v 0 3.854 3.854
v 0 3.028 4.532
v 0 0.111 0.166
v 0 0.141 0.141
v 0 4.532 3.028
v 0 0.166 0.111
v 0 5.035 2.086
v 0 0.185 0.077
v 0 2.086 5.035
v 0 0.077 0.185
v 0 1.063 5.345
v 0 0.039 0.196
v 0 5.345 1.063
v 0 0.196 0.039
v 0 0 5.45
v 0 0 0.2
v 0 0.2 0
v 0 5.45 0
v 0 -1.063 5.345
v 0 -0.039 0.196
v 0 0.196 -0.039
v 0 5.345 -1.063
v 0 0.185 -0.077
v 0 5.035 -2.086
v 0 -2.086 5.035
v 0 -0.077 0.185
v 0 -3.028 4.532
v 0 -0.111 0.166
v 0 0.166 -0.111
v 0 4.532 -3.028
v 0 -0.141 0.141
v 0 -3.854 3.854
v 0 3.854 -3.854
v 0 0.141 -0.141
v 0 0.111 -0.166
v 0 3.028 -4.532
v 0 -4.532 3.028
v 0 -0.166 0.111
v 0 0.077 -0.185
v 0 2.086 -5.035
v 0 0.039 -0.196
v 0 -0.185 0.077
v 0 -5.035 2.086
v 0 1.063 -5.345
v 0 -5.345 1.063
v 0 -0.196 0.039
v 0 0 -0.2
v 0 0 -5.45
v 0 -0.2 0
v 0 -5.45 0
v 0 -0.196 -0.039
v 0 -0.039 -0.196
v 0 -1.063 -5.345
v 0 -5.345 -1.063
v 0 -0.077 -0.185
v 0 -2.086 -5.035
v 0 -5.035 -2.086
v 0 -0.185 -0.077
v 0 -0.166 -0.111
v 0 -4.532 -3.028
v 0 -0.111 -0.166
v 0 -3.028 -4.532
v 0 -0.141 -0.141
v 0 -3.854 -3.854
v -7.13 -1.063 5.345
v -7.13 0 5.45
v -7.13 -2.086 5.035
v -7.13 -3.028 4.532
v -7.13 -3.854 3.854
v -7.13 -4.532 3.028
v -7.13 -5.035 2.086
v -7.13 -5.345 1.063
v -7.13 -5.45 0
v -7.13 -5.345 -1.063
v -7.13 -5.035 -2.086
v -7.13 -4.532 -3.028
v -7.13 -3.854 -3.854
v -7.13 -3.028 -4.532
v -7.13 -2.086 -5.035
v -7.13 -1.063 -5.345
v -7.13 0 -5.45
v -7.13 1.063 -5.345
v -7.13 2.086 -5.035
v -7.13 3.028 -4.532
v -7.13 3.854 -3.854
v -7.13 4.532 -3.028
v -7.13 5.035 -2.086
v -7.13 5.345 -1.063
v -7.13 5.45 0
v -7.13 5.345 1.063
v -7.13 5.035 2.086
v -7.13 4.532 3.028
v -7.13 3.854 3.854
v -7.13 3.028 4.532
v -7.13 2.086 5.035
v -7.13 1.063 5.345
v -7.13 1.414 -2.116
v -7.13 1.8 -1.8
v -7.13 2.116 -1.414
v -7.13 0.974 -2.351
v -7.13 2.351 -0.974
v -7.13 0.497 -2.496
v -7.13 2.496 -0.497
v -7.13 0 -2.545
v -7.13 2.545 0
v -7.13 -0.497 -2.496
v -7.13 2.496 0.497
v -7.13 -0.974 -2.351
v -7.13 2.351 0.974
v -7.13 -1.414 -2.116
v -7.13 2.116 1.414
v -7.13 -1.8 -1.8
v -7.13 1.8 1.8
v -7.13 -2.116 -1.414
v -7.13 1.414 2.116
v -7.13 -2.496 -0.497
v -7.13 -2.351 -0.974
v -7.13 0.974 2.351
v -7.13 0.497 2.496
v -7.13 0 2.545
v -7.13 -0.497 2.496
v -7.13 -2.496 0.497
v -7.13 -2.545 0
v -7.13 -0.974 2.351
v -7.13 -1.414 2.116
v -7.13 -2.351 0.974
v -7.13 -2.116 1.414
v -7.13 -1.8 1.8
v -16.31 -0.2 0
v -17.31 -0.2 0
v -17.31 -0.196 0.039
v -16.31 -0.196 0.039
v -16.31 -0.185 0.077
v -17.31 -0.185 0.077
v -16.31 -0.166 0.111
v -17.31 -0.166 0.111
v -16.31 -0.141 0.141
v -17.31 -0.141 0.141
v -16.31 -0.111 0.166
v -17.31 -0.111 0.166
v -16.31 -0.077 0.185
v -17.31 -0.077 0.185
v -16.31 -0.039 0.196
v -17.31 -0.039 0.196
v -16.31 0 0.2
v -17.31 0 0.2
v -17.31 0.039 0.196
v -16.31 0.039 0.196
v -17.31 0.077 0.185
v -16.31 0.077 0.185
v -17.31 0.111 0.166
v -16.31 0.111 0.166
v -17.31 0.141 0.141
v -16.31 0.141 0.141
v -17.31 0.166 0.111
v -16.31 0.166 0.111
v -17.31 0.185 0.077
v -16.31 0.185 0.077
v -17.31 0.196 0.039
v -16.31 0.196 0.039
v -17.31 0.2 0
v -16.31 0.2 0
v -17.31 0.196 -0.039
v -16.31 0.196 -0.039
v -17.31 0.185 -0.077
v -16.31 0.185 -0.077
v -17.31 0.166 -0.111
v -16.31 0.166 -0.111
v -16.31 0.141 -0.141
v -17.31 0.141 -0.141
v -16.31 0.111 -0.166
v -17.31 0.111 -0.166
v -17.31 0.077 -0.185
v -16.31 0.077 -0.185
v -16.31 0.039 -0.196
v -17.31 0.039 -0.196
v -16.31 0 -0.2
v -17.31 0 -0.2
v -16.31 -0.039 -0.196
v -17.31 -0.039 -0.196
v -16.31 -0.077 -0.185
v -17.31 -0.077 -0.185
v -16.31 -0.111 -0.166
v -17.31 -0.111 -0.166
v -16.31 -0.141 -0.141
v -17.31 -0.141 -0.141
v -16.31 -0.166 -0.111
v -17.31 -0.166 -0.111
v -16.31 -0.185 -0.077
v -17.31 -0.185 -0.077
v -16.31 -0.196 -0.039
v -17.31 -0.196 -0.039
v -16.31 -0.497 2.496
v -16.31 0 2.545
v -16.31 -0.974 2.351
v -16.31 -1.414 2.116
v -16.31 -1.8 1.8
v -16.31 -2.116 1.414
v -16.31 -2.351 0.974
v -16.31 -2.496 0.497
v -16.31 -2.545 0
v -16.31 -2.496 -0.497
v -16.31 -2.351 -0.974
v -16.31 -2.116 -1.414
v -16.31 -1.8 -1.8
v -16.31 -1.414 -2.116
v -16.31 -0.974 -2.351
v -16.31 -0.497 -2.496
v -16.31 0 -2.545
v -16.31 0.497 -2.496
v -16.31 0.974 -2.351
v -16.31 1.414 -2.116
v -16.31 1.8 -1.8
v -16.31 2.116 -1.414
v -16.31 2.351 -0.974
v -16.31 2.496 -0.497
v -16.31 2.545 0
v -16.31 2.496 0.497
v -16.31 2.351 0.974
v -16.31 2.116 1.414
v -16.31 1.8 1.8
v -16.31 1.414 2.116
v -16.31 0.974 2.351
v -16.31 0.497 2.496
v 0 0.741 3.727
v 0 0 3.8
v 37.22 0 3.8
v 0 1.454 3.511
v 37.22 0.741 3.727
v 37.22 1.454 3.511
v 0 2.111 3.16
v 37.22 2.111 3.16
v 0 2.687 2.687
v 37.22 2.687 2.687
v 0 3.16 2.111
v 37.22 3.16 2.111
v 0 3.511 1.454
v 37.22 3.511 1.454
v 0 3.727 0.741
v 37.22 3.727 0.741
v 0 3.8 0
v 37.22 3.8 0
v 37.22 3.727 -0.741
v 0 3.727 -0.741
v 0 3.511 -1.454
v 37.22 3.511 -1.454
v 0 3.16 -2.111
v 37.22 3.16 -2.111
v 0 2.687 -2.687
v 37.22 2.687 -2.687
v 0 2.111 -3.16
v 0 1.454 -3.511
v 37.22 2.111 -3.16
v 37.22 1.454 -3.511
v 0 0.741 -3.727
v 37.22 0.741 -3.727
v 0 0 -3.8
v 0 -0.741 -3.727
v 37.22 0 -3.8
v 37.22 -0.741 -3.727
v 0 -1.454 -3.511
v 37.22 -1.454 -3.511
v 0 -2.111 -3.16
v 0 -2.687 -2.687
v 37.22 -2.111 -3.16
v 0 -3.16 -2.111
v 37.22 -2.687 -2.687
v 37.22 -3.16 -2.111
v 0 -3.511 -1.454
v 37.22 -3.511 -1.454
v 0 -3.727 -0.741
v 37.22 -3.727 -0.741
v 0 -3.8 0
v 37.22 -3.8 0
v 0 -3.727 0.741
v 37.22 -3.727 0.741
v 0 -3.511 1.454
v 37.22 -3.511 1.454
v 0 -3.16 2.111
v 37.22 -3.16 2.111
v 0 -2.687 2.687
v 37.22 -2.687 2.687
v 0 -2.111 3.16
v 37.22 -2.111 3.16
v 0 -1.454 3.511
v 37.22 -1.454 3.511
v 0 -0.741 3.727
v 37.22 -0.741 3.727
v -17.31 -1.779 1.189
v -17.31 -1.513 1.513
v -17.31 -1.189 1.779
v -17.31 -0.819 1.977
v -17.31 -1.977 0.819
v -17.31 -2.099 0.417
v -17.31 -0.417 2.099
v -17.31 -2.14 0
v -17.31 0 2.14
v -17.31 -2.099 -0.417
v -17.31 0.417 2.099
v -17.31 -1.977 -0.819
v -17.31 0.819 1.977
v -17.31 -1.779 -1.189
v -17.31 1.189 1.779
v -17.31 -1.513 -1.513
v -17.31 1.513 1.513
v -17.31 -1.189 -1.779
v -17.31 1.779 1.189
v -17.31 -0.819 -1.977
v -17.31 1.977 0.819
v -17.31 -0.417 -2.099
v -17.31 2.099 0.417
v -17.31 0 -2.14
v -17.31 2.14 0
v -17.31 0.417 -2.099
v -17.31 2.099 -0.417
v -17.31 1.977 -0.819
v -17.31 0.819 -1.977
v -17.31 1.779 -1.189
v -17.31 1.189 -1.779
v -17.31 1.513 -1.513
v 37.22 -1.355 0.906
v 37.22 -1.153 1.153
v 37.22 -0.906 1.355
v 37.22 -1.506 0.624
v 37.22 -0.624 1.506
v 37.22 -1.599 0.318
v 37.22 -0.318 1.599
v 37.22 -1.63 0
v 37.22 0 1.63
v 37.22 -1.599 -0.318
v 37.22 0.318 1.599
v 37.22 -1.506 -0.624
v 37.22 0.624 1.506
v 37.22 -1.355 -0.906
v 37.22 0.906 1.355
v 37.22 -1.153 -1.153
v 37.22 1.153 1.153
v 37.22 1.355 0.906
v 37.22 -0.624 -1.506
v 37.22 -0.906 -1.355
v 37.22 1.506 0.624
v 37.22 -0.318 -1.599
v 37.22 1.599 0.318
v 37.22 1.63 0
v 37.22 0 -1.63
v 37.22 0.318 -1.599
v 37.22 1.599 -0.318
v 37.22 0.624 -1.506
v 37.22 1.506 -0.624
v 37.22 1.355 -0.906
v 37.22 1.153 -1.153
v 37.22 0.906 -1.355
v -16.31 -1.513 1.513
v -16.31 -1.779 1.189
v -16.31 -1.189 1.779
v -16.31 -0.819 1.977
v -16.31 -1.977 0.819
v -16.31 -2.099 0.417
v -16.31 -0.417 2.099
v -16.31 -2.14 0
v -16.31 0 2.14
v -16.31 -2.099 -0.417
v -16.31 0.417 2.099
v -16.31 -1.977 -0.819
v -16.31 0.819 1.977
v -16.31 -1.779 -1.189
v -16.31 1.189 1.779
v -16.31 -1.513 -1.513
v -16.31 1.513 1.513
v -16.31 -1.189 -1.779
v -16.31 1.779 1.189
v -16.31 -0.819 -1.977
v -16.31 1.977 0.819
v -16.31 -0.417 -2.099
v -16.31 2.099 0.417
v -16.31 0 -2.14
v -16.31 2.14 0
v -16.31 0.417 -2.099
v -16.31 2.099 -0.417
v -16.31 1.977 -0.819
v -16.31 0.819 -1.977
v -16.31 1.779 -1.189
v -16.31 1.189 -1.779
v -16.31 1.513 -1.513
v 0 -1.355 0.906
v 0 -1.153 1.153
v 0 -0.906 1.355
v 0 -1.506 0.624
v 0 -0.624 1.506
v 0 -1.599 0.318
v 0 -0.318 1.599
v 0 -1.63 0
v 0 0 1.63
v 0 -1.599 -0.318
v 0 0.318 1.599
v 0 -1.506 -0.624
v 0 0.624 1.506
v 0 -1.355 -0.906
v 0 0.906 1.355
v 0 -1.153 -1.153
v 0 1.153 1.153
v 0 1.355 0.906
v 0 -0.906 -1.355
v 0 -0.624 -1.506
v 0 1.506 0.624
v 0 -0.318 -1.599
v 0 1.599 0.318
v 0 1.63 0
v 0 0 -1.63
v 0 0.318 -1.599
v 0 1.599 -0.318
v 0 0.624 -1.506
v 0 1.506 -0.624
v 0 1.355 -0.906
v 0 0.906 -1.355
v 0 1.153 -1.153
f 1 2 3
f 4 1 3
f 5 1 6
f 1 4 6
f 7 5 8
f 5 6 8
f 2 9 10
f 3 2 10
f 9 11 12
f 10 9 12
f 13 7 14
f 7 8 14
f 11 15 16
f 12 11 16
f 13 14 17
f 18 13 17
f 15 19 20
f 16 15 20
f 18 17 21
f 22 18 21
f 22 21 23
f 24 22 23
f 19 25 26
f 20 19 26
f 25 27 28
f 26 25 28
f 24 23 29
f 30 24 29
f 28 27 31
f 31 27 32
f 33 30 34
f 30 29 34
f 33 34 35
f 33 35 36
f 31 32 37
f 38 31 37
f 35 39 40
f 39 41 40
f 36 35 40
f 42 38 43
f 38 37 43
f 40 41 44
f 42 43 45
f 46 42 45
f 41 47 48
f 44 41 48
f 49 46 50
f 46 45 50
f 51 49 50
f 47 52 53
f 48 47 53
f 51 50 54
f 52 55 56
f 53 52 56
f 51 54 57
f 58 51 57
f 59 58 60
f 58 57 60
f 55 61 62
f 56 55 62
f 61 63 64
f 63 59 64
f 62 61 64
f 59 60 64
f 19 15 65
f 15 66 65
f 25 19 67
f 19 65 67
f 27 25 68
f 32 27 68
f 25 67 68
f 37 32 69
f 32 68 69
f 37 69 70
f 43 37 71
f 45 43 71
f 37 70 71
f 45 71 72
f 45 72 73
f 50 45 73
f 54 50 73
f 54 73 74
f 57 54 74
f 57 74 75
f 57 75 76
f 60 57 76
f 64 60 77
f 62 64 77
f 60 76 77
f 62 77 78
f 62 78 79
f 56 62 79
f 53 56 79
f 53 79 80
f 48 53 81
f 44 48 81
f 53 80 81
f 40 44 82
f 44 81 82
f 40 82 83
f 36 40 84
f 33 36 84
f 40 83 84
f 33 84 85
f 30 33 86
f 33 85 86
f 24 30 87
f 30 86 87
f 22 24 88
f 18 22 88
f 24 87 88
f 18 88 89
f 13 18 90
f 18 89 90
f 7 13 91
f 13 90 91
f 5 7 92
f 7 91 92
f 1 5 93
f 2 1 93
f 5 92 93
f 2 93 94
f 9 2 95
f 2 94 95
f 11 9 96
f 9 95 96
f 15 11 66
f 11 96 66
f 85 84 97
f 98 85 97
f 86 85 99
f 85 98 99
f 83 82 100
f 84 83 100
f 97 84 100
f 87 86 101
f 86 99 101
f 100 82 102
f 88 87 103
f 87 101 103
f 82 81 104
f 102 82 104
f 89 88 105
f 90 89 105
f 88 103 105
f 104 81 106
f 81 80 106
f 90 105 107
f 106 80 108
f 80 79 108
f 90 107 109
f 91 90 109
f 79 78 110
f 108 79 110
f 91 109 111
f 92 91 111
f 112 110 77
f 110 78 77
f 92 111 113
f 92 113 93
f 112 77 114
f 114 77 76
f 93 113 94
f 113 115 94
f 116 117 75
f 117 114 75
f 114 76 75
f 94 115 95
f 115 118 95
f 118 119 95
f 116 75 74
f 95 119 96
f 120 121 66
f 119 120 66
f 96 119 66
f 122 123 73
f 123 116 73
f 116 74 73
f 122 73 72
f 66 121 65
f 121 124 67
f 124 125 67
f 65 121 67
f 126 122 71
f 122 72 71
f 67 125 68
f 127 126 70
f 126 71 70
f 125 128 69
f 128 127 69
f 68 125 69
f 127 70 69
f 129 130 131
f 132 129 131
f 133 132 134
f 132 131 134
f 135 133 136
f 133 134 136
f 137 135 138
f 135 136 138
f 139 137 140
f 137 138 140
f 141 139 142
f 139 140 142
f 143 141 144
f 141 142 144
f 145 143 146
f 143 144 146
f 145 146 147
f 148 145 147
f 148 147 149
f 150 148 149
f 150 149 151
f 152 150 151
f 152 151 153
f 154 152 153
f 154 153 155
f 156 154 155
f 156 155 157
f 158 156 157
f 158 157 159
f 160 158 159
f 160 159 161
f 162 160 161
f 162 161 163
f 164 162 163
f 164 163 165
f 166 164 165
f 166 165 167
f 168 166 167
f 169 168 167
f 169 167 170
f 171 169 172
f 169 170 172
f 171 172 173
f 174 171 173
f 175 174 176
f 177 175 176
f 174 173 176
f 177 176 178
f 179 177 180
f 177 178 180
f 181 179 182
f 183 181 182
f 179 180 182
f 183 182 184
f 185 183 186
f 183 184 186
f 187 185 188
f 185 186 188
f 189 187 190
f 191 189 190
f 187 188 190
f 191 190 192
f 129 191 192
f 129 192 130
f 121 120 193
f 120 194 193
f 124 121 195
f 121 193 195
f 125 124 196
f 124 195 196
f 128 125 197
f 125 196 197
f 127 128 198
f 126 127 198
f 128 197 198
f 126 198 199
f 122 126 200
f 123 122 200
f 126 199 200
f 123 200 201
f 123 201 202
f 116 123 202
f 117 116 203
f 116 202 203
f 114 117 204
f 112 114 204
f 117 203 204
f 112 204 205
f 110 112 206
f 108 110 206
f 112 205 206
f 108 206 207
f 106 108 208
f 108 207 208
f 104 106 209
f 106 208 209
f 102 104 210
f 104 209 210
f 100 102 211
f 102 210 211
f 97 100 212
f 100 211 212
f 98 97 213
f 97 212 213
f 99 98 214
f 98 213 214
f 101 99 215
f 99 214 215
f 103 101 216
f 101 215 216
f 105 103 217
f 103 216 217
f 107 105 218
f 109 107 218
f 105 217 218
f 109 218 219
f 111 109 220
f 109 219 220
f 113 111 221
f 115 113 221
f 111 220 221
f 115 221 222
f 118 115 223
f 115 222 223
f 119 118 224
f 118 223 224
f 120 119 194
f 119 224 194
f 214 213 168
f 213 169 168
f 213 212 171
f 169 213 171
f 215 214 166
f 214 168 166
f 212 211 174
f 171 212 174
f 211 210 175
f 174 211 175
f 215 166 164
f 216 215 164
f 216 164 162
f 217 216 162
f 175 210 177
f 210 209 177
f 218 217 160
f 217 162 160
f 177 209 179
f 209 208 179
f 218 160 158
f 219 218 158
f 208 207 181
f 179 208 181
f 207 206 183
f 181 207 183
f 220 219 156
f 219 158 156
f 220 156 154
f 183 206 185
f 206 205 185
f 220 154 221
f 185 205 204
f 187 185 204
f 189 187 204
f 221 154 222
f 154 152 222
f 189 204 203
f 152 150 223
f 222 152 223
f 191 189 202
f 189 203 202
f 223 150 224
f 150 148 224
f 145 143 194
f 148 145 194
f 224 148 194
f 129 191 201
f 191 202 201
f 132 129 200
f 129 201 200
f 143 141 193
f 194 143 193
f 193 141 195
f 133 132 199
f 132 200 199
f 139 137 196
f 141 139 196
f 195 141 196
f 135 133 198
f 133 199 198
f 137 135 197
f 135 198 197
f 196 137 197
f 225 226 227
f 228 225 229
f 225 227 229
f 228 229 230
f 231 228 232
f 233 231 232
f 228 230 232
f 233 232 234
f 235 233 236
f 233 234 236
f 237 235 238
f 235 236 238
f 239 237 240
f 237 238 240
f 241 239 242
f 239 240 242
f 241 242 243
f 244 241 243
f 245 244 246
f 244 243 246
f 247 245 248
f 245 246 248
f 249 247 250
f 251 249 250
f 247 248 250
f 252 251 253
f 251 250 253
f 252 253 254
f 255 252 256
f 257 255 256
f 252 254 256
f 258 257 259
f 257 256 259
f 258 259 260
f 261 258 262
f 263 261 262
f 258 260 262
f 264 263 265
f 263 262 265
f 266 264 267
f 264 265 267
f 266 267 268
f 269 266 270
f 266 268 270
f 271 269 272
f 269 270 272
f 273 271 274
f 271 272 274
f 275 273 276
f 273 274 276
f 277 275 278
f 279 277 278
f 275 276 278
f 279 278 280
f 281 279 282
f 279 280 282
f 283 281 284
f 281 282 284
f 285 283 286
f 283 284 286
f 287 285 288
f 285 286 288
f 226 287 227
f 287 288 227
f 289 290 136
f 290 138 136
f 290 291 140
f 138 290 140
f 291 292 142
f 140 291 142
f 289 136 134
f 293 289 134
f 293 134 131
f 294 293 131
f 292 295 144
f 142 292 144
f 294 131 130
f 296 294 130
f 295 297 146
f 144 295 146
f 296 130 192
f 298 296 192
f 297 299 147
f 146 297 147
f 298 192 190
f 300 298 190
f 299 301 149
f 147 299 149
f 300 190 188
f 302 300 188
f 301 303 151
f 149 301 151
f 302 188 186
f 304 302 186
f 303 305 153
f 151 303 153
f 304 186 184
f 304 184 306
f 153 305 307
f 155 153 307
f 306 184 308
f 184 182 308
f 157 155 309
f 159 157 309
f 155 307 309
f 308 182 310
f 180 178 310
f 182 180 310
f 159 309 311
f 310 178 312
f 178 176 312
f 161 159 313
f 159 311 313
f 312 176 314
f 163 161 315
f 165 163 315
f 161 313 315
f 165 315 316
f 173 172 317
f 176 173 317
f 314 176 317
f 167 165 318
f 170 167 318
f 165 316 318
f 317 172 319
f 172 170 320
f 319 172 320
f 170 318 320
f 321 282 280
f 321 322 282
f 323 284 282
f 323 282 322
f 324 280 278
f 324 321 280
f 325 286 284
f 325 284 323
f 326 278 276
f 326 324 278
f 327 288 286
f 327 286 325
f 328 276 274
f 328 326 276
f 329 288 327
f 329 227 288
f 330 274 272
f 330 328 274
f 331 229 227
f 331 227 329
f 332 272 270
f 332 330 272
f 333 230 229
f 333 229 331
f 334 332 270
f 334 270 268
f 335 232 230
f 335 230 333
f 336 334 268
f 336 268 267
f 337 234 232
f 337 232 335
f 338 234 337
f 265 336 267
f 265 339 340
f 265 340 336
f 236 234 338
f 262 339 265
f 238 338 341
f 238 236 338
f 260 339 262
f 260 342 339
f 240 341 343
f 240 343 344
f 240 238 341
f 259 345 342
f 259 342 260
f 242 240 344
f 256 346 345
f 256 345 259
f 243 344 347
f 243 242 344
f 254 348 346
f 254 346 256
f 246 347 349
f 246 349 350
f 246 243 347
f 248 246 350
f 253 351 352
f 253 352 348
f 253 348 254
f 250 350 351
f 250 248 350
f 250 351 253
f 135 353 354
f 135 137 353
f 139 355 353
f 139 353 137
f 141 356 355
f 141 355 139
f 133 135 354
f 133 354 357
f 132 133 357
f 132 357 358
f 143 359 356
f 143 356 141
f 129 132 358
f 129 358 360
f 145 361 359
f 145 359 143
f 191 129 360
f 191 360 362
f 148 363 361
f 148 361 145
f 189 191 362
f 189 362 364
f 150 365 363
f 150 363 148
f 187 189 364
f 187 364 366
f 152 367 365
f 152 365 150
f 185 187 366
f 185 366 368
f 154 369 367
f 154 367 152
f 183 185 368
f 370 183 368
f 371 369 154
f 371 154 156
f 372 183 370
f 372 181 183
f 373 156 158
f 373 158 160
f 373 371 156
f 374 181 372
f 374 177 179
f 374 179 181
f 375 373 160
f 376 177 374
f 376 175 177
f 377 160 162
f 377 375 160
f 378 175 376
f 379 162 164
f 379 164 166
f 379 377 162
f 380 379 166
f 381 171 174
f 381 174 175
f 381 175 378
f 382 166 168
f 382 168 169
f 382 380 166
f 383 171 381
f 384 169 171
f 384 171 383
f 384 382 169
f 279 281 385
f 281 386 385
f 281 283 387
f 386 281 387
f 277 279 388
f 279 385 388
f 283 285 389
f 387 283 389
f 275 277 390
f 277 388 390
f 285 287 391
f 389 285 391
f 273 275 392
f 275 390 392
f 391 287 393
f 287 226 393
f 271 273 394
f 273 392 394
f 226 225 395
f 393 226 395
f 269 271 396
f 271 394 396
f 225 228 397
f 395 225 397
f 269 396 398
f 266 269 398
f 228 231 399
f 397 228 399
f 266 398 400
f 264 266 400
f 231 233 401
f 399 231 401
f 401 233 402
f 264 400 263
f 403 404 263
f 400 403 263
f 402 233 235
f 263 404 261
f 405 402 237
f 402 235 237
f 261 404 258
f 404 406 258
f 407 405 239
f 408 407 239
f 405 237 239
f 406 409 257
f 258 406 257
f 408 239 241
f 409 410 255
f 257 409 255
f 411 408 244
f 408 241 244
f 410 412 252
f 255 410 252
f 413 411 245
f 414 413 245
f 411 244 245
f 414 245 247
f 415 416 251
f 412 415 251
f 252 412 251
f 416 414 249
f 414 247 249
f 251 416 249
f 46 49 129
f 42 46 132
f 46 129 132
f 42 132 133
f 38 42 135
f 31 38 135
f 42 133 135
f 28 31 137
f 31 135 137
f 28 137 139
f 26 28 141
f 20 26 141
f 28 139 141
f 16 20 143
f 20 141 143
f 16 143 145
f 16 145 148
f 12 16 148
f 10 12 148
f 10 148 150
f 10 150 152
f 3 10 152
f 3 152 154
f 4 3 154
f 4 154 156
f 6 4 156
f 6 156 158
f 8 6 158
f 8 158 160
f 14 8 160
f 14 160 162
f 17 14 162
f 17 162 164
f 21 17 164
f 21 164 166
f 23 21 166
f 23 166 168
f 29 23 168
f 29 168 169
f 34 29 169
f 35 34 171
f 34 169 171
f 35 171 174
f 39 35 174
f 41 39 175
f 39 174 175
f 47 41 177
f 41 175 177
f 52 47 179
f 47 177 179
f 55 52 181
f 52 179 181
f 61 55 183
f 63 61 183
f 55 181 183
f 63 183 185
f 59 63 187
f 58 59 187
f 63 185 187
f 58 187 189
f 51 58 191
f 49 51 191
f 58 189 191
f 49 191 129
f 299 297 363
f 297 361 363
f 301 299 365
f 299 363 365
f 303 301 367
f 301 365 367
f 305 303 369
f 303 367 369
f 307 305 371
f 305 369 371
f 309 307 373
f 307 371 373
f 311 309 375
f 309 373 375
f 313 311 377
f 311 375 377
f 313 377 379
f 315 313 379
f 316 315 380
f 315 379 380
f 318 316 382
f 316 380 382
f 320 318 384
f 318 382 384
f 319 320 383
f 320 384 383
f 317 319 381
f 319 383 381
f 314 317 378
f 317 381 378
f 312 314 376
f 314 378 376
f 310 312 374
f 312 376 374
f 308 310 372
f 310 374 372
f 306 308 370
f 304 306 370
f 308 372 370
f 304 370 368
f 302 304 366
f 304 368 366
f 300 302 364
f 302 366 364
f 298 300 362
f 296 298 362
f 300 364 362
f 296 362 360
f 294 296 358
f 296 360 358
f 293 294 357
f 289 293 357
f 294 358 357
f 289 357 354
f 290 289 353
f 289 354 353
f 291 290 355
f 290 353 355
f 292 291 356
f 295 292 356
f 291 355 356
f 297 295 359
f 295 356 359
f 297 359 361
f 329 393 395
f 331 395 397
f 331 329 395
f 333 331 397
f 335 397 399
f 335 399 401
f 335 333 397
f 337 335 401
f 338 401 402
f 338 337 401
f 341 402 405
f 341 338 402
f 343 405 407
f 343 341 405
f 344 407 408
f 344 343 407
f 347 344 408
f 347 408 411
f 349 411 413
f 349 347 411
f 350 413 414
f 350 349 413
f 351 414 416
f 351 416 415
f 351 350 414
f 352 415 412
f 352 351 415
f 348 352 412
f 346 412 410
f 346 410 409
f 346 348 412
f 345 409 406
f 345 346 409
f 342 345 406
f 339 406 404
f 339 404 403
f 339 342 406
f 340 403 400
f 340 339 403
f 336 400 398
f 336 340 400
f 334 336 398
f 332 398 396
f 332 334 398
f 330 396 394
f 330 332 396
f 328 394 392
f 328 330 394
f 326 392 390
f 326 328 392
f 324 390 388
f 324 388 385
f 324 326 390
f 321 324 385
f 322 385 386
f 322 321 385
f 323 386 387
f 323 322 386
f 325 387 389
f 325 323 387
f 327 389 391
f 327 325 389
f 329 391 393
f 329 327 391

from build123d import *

# Parameters (mm, degrees)
F0_W     = 37.22
F0_H     = 2.17
F2_W     = 1
F2_H     = 2.14
F6_R     = 0.2
F7_DEPTH = 54.531


with BuildPart() as f3:
    # F0 (on Front) → F3 (revolve)
    with BuildSketch(Plane.XZ):
        with Locations((18.61, 2.715)):
            Rectangle(F0_W, F0_H)
    revolve(axis=Axis((9.868568, 0, 0), (-1, 0, 0)))


with BuildPart() as f4:
    # F1 (on Front) → F4 (revolve)
    with BuildSketch(Plane.XZ):
        Polygon((-16.31, 0), (0, 0), (0, 5.45), (-7.13, 5.45), (-7.13, 2.545), (-16.31, 2.545), align=None)
    revolve(axis=Axis((-8.155, 0, 0), (1, 0, 0)))


with BuildPart() as f5:
    # F2 (on Front) → F5 (revolve)
    with BuildSketch(Plane.XZ):
        with Locations((-16.81, 1.07)):
            Rectangle(F2_W, F2_H)
    revolve(axis=Axis((-16.81, 0, 0), (-1, 0, 0)))


with BuildPart() as f7_tool:
    # F6 (on face) → F7 (new body, through all)
    with BuildSketch(Plane(origin=(-17.31, 0, 0), x_dir=(0, -1, 0), z_dir=(-1, 0, 0))):
        Circle(F6_R)
    extrude(amount=-F7_DEPTH)


with BuildPart() as f4_1:
    add(f4.part)

    # F7: cut by f7_tool
    add(f7_tool.part, mode=Mode.SUBTRACT)


with BuildPart() as f5_1:
    add(f5.part)

    # F7: cut by f7_tool
    add(f7_tool.part, mode=Mode.SUBTRACT)


solid = Compound([f3.part, f4_1.part, f5_1.part])
